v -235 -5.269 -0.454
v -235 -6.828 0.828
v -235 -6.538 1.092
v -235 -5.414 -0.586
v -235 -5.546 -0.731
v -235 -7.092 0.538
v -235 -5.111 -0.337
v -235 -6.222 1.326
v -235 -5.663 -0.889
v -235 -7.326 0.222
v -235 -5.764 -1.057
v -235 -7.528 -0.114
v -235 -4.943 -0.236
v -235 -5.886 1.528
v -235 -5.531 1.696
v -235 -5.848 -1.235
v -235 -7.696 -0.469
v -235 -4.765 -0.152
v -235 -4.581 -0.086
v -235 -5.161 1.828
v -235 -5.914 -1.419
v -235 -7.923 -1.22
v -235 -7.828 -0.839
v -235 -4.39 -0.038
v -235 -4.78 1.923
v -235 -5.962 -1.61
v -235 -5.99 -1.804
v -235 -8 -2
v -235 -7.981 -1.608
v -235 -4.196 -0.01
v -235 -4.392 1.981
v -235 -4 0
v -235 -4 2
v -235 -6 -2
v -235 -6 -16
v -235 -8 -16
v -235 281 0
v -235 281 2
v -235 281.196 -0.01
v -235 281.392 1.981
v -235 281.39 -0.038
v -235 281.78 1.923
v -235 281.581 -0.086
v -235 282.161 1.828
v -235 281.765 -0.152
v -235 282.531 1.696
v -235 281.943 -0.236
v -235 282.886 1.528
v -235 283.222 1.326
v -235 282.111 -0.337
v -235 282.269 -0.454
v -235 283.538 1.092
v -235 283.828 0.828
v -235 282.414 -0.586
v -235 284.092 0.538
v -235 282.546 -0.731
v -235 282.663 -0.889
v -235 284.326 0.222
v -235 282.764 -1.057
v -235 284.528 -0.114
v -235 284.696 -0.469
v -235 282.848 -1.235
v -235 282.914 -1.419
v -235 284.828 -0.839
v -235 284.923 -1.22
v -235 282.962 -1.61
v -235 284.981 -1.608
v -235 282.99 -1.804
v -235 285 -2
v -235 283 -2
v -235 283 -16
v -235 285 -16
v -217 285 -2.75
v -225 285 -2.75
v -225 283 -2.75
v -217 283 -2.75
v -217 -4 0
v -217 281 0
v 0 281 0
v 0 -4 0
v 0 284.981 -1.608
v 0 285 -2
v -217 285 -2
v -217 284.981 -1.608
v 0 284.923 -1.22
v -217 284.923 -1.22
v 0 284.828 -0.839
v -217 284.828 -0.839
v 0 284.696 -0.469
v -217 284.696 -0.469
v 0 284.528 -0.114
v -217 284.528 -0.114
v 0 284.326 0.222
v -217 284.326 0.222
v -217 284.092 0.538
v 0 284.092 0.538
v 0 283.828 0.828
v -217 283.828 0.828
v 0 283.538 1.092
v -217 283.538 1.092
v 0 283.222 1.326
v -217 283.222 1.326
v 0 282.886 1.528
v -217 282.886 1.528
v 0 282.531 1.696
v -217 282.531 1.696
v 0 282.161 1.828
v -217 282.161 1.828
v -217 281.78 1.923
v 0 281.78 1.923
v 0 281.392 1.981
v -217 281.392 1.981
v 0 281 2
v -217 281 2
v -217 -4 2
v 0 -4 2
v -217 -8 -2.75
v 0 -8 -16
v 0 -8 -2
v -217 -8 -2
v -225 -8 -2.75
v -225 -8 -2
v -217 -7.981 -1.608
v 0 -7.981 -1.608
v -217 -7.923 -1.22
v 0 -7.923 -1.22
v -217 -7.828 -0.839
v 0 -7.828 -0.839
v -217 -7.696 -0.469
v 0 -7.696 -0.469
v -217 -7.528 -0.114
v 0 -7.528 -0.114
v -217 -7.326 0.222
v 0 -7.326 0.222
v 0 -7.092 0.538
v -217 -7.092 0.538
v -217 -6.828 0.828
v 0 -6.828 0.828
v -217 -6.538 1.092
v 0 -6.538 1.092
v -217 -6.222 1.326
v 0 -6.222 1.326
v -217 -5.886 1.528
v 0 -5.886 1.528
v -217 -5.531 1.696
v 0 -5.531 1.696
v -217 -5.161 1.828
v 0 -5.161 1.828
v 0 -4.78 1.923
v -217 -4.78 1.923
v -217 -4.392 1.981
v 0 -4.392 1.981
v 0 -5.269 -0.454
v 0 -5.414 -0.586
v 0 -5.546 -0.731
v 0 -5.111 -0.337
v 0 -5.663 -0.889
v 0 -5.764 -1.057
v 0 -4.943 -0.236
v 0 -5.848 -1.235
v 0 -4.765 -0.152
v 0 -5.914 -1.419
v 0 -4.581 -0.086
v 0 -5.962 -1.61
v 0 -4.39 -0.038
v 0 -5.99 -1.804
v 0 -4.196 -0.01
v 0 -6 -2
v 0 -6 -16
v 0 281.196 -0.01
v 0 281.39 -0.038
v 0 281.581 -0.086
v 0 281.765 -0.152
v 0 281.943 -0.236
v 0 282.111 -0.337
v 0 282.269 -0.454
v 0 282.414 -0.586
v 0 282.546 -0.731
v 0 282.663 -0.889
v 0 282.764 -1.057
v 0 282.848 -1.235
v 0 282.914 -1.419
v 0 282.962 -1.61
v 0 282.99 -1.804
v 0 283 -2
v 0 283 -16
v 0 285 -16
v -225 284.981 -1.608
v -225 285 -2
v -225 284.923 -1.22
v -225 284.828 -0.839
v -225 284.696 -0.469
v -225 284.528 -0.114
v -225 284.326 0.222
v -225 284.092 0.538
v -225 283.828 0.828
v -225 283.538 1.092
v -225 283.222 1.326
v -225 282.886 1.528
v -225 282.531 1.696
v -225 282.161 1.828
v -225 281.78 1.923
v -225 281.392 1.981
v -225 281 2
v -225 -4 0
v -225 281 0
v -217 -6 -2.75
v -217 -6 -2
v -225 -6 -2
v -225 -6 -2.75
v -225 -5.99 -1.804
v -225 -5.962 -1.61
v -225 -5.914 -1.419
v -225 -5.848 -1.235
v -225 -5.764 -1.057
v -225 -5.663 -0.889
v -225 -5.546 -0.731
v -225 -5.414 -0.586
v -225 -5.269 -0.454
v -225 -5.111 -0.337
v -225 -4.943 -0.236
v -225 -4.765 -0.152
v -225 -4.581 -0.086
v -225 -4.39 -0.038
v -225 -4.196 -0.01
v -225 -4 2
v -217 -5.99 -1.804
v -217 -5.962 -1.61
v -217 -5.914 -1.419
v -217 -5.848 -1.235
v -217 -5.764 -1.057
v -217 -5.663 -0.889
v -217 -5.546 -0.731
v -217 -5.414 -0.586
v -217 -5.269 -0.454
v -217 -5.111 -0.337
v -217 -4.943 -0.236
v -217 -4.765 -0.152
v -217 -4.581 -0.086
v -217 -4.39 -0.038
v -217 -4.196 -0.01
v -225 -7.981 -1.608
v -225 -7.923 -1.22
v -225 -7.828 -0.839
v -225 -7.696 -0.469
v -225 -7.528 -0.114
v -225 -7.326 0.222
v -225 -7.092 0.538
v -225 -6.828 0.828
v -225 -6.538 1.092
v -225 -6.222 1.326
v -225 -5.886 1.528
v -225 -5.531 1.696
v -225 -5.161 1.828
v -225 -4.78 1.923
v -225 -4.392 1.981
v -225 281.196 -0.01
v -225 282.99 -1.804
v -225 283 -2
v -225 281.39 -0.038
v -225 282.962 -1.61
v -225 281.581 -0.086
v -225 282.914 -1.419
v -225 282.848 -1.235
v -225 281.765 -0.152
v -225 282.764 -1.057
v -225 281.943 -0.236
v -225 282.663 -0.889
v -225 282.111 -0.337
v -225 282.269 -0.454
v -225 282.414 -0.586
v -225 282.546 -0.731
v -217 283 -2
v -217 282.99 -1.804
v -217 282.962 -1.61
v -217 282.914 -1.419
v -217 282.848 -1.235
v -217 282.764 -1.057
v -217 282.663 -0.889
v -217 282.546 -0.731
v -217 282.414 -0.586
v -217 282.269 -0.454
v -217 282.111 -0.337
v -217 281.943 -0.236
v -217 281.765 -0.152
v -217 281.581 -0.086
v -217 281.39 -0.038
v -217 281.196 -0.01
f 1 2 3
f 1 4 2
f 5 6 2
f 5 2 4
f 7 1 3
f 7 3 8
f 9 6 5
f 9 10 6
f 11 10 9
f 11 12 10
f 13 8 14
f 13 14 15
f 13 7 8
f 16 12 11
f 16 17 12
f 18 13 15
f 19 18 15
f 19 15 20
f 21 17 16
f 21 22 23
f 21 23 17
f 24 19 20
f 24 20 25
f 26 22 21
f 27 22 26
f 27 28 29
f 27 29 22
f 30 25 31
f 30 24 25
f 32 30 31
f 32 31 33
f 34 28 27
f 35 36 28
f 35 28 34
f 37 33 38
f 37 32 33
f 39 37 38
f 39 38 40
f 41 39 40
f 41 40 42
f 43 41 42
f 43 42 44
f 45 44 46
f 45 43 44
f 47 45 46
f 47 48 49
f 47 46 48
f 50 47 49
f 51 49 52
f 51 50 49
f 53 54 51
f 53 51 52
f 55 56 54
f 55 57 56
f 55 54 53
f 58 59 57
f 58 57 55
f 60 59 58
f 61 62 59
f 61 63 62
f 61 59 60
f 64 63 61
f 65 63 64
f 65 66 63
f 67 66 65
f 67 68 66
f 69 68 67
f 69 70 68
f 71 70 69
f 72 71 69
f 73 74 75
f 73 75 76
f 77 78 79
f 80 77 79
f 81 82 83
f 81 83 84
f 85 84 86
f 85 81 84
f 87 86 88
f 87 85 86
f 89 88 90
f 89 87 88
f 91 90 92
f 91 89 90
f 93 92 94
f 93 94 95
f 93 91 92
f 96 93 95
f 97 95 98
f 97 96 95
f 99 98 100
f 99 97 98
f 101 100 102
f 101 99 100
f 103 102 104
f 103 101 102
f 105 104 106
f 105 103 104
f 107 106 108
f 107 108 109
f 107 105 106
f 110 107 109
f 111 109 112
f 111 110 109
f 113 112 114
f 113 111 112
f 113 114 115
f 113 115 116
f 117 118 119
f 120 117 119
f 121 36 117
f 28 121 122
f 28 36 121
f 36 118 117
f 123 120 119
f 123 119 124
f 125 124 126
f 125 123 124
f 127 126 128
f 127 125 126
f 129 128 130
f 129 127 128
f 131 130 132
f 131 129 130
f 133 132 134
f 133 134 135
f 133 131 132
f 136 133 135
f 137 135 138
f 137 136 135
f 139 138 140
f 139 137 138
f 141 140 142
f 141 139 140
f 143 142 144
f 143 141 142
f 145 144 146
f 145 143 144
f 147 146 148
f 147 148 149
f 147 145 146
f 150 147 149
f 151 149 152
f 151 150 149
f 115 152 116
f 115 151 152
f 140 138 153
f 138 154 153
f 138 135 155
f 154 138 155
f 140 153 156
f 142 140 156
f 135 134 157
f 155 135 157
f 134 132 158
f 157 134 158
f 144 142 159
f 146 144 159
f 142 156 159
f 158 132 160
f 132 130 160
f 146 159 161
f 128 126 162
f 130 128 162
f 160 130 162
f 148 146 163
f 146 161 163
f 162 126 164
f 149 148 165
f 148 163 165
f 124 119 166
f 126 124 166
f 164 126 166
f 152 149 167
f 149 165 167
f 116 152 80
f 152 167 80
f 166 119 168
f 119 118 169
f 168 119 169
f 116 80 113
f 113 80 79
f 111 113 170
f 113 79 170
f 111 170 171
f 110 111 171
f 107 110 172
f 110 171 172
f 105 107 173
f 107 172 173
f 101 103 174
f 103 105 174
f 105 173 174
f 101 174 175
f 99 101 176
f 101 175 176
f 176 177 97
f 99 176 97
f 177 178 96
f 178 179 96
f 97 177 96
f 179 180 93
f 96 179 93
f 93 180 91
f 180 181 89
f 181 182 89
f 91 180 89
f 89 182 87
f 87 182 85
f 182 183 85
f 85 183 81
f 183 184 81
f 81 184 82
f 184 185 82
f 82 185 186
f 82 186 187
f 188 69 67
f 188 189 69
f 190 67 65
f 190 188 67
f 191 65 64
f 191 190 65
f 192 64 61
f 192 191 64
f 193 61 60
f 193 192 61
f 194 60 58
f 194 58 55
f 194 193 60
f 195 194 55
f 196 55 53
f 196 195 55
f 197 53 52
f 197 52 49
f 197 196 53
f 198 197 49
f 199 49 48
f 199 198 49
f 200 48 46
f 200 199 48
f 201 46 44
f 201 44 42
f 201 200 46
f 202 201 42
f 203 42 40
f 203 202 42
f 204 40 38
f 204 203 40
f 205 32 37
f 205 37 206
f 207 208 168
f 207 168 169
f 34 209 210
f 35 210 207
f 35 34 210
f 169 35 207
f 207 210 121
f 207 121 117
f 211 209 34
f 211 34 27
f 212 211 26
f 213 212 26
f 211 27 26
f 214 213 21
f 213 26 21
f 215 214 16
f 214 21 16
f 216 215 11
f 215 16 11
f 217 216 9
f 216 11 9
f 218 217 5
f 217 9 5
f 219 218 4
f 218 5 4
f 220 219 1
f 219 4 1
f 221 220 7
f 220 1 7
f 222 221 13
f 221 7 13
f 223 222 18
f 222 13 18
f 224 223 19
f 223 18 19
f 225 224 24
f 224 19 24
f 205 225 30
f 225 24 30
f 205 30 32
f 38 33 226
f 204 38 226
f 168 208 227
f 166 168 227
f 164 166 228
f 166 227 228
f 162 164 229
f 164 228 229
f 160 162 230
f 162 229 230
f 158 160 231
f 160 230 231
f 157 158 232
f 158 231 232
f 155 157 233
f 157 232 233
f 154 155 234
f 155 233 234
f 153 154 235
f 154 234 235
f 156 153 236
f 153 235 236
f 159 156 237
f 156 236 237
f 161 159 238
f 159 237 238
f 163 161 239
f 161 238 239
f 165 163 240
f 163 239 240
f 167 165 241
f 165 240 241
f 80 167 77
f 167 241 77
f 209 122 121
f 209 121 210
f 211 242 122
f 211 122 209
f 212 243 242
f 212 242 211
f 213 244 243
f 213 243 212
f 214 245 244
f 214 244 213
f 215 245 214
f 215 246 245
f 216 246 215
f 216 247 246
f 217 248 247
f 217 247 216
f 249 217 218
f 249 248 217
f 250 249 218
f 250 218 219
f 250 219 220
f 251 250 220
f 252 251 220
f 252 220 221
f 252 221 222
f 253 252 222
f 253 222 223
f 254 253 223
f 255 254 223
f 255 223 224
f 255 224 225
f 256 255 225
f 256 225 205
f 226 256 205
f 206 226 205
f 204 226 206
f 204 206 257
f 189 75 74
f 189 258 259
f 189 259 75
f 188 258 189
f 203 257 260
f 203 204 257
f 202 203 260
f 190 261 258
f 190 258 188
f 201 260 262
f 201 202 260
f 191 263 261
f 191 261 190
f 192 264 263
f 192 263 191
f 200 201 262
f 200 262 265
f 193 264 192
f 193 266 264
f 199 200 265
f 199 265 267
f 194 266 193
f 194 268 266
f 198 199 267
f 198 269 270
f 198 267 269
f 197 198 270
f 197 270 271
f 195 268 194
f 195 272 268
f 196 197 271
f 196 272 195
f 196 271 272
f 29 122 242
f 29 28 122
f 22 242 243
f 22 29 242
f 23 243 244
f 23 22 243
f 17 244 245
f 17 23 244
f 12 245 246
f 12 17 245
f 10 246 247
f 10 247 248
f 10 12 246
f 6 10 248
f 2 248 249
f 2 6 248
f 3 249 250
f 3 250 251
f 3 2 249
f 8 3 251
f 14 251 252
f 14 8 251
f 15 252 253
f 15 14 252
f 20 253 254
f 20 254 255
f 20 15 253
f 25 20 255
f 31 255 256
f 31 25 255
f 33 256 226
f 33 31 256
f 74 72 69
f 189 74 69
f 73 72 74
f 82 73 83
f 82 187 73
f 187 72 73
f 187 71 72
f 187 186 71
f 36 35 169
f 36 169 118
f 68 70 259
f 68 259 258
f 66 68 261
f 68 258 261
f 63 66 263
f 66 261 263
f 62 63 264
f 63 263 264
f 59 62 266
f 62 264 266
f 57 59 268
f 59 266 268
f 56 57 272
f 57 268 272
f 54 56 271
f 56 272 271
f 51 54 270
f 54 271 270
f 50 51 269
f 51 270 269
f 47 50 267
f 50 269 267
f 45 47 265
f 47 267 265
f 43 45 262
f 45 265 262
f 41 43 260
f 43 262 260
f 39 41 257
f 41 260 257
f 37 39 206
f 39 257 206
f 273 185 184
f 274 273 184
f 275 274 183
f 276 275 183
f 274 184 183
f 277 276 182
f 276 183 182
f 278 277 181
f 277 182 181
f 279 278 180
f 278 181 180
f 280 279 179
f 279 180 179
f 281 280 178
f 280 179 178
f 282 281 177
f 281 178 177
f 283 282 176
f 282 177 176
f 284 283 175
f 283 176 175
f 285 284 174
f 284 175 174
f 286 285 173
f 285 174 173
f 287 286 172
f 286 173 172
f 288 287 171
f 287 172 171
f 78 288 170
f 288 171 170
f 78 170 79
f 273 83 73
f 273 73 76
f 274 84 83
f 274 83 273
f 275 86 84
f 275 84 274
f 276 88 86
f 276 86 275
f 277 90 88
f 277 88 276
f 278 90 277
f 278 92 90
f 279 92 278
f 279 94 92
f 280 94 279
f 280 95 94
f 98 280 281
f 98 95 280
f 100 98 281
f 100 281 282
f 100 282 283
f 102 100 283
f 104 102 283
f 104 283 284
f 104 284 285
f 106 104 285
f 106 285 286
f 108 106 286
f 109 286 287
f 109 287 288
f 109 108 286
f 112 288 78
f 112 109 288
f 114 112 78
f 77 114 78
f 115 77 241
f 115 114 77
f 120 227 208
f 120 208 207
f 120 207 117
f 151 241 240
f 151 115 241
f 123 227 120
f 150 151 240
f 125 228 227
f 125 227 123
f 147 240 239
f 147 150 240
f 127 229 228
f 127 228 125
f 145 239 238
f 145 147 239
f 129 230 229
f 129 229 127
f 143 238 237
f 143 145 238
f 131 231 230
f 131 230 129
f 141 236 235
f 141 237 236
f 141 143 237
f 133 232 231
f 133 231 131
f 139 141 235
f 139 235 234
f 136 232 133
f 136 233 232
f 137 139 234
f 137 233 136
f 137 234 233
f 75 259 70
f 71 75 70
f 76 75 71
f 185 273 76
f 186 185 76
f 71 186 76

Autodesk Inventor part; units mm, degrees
ref_plane "YZ Plane" through (0, 0, 0) normal (1, 0, 0) x (0, 1, 0)
ref_plane "XZ Plane" through (0, 0, 0) normal (0, 1, 0) x (-1, 0, 0)
ref_plane "XY Plane" through (0, 0, 0) normal (0, 0, 1) x (1, 0, 0)
sketch "Skizze1" plane through (0, 0, 0) normal (0, 0, 1) x (1, 0, 0)
  line L0 (-273, 285) -> (68, 285)
  line L1 (68, -8) -> (-273, -8)
  line L2 (5, 153.9294) -> (5, 157.0706)
  line L3 (5, 253.9294) -> (5, 257.0706)
  line L4 (0, 285) -> (-235, 285)
  line L5 (-235, 285) -> (-235, -8)
  line L6 (-235, -8) -> (0, -8)
  line L7 (0, -8) -> (0, 285)
  line L8 (-199.0415, -3.8) -> (-199.0415, -6)
  line L9 (-138, 2) -> (-138, 4.5)
  line L10 (-250, 282.9) -> (-250, -5.9)
  point P0 (0, 0)
  point P1 (-273, -8)
  dimension "d0" = 5
  dimension "d1" = 0
  dimension "d2" = 0
  dimension "d15" = 15
extrude "Grobblech1" add sketch "Skizze1" along normal blind 2
sketch "Skizze2" plane through (-235, -6, 2) normal (0, -1, 0) x (1, 0, 0)
  line L0 (235, 0) -> (0, 0)
  line L1 (0, 0) -> (0, -18)
  line L2 (0, -18) -> (235, -18)
  line L3 (235, -18) -> (235, 0)
edge flange "Lasche1" height 18 angle 90 thickness 2 bend radius 2 thickness toward (0, -1, 0) relief tear relief width 2 relief depth 1 corner gap 2 corner form 0 edges at (-117.5, -8, 0) (-117.5, 285, 0) wall of the first edge with corners at (0, -6, 2) (-235, -6, 2) (-235, -6, -16) (0, -6, -16)
bend "Biegung1"
corner "Ecke1"
sketch "Skizze3" plane through (0, 0, 2) normal (0, 0, 1) x (1, 0, 0)
  line L0 (-273, 285) -> (68, 285) construction
  line L1 (0, 281) -> (0, -4) construction
  line L2 (0, 281) -> (0, 285) construction
  line L3 (0, -8) -> (0, -4) construction
  line L4 (68, -8) -> (-273, -8) construction
  line L5 (-235, -4) -> (-235, 281) construction
  line L6 (-235, 285) -> (-235, 281) construction
  line L7 (-235, -4) -> (-235, -8) construction
  line L8 (-250, 282.9) -> (-250, -5.9) construction
  line L9 (-225, 285) -> (-225, -8) construction
  line L10 (0, -8) -> (-235, -8) projected
  line L11 (-225, 285) -> (-217, 285)
  line L12 (-217, 285) -> (-217, -8)
  line L13 (-217, -8) -> (-225, -8)
  line L14 (-225, -8) -> (-225, 285)
  point P0 (0, 0)
  dimension "d16" = 25
  dimension "d17" = 8
  dimension "d18" = 293
extrude "Extrusion1" cut sketch "Skizze3" against normal blind 4.75
equation "\"d4\" = Stärke"
equation "\"d5\" = BreiteBiegungsfreistellung"
equation "\"d6\" = TiefeBiegungsfreistellung"
equation "\"d7\" = MinimalRest"
equation "\"d8\" = Übergangsradius"
equation "\"d11\" = Biegeradius"
equation "\"d12\" = GrößeEckenfreistellung"
equation "\"d13\" = Abstandsgröße"
equation "\"d14\" = JacobiRadiusGröße"
equation "\"Biegeradius\" = Stärke"
equation "\"BreiteBiegungsfreistellung\" = Stärke"
equation "\"TiefeBiegungsfreistellung\" = 0.5 * Stärke"
equation "\"GrößeEckenfreistellung\" = 4 * Stärke"
equation "\"MinimalRest\" = 2 * Stärke"
equation "\"Übergangsradius\" = Biegeradius"
equation "\"JacobiRadiusGröße\" = Biegeradius"
equation "\"Abstandsgröße\" = Stärke"
equation "\"Stärke\" = 2"
properties part number "EinschubRechts"
